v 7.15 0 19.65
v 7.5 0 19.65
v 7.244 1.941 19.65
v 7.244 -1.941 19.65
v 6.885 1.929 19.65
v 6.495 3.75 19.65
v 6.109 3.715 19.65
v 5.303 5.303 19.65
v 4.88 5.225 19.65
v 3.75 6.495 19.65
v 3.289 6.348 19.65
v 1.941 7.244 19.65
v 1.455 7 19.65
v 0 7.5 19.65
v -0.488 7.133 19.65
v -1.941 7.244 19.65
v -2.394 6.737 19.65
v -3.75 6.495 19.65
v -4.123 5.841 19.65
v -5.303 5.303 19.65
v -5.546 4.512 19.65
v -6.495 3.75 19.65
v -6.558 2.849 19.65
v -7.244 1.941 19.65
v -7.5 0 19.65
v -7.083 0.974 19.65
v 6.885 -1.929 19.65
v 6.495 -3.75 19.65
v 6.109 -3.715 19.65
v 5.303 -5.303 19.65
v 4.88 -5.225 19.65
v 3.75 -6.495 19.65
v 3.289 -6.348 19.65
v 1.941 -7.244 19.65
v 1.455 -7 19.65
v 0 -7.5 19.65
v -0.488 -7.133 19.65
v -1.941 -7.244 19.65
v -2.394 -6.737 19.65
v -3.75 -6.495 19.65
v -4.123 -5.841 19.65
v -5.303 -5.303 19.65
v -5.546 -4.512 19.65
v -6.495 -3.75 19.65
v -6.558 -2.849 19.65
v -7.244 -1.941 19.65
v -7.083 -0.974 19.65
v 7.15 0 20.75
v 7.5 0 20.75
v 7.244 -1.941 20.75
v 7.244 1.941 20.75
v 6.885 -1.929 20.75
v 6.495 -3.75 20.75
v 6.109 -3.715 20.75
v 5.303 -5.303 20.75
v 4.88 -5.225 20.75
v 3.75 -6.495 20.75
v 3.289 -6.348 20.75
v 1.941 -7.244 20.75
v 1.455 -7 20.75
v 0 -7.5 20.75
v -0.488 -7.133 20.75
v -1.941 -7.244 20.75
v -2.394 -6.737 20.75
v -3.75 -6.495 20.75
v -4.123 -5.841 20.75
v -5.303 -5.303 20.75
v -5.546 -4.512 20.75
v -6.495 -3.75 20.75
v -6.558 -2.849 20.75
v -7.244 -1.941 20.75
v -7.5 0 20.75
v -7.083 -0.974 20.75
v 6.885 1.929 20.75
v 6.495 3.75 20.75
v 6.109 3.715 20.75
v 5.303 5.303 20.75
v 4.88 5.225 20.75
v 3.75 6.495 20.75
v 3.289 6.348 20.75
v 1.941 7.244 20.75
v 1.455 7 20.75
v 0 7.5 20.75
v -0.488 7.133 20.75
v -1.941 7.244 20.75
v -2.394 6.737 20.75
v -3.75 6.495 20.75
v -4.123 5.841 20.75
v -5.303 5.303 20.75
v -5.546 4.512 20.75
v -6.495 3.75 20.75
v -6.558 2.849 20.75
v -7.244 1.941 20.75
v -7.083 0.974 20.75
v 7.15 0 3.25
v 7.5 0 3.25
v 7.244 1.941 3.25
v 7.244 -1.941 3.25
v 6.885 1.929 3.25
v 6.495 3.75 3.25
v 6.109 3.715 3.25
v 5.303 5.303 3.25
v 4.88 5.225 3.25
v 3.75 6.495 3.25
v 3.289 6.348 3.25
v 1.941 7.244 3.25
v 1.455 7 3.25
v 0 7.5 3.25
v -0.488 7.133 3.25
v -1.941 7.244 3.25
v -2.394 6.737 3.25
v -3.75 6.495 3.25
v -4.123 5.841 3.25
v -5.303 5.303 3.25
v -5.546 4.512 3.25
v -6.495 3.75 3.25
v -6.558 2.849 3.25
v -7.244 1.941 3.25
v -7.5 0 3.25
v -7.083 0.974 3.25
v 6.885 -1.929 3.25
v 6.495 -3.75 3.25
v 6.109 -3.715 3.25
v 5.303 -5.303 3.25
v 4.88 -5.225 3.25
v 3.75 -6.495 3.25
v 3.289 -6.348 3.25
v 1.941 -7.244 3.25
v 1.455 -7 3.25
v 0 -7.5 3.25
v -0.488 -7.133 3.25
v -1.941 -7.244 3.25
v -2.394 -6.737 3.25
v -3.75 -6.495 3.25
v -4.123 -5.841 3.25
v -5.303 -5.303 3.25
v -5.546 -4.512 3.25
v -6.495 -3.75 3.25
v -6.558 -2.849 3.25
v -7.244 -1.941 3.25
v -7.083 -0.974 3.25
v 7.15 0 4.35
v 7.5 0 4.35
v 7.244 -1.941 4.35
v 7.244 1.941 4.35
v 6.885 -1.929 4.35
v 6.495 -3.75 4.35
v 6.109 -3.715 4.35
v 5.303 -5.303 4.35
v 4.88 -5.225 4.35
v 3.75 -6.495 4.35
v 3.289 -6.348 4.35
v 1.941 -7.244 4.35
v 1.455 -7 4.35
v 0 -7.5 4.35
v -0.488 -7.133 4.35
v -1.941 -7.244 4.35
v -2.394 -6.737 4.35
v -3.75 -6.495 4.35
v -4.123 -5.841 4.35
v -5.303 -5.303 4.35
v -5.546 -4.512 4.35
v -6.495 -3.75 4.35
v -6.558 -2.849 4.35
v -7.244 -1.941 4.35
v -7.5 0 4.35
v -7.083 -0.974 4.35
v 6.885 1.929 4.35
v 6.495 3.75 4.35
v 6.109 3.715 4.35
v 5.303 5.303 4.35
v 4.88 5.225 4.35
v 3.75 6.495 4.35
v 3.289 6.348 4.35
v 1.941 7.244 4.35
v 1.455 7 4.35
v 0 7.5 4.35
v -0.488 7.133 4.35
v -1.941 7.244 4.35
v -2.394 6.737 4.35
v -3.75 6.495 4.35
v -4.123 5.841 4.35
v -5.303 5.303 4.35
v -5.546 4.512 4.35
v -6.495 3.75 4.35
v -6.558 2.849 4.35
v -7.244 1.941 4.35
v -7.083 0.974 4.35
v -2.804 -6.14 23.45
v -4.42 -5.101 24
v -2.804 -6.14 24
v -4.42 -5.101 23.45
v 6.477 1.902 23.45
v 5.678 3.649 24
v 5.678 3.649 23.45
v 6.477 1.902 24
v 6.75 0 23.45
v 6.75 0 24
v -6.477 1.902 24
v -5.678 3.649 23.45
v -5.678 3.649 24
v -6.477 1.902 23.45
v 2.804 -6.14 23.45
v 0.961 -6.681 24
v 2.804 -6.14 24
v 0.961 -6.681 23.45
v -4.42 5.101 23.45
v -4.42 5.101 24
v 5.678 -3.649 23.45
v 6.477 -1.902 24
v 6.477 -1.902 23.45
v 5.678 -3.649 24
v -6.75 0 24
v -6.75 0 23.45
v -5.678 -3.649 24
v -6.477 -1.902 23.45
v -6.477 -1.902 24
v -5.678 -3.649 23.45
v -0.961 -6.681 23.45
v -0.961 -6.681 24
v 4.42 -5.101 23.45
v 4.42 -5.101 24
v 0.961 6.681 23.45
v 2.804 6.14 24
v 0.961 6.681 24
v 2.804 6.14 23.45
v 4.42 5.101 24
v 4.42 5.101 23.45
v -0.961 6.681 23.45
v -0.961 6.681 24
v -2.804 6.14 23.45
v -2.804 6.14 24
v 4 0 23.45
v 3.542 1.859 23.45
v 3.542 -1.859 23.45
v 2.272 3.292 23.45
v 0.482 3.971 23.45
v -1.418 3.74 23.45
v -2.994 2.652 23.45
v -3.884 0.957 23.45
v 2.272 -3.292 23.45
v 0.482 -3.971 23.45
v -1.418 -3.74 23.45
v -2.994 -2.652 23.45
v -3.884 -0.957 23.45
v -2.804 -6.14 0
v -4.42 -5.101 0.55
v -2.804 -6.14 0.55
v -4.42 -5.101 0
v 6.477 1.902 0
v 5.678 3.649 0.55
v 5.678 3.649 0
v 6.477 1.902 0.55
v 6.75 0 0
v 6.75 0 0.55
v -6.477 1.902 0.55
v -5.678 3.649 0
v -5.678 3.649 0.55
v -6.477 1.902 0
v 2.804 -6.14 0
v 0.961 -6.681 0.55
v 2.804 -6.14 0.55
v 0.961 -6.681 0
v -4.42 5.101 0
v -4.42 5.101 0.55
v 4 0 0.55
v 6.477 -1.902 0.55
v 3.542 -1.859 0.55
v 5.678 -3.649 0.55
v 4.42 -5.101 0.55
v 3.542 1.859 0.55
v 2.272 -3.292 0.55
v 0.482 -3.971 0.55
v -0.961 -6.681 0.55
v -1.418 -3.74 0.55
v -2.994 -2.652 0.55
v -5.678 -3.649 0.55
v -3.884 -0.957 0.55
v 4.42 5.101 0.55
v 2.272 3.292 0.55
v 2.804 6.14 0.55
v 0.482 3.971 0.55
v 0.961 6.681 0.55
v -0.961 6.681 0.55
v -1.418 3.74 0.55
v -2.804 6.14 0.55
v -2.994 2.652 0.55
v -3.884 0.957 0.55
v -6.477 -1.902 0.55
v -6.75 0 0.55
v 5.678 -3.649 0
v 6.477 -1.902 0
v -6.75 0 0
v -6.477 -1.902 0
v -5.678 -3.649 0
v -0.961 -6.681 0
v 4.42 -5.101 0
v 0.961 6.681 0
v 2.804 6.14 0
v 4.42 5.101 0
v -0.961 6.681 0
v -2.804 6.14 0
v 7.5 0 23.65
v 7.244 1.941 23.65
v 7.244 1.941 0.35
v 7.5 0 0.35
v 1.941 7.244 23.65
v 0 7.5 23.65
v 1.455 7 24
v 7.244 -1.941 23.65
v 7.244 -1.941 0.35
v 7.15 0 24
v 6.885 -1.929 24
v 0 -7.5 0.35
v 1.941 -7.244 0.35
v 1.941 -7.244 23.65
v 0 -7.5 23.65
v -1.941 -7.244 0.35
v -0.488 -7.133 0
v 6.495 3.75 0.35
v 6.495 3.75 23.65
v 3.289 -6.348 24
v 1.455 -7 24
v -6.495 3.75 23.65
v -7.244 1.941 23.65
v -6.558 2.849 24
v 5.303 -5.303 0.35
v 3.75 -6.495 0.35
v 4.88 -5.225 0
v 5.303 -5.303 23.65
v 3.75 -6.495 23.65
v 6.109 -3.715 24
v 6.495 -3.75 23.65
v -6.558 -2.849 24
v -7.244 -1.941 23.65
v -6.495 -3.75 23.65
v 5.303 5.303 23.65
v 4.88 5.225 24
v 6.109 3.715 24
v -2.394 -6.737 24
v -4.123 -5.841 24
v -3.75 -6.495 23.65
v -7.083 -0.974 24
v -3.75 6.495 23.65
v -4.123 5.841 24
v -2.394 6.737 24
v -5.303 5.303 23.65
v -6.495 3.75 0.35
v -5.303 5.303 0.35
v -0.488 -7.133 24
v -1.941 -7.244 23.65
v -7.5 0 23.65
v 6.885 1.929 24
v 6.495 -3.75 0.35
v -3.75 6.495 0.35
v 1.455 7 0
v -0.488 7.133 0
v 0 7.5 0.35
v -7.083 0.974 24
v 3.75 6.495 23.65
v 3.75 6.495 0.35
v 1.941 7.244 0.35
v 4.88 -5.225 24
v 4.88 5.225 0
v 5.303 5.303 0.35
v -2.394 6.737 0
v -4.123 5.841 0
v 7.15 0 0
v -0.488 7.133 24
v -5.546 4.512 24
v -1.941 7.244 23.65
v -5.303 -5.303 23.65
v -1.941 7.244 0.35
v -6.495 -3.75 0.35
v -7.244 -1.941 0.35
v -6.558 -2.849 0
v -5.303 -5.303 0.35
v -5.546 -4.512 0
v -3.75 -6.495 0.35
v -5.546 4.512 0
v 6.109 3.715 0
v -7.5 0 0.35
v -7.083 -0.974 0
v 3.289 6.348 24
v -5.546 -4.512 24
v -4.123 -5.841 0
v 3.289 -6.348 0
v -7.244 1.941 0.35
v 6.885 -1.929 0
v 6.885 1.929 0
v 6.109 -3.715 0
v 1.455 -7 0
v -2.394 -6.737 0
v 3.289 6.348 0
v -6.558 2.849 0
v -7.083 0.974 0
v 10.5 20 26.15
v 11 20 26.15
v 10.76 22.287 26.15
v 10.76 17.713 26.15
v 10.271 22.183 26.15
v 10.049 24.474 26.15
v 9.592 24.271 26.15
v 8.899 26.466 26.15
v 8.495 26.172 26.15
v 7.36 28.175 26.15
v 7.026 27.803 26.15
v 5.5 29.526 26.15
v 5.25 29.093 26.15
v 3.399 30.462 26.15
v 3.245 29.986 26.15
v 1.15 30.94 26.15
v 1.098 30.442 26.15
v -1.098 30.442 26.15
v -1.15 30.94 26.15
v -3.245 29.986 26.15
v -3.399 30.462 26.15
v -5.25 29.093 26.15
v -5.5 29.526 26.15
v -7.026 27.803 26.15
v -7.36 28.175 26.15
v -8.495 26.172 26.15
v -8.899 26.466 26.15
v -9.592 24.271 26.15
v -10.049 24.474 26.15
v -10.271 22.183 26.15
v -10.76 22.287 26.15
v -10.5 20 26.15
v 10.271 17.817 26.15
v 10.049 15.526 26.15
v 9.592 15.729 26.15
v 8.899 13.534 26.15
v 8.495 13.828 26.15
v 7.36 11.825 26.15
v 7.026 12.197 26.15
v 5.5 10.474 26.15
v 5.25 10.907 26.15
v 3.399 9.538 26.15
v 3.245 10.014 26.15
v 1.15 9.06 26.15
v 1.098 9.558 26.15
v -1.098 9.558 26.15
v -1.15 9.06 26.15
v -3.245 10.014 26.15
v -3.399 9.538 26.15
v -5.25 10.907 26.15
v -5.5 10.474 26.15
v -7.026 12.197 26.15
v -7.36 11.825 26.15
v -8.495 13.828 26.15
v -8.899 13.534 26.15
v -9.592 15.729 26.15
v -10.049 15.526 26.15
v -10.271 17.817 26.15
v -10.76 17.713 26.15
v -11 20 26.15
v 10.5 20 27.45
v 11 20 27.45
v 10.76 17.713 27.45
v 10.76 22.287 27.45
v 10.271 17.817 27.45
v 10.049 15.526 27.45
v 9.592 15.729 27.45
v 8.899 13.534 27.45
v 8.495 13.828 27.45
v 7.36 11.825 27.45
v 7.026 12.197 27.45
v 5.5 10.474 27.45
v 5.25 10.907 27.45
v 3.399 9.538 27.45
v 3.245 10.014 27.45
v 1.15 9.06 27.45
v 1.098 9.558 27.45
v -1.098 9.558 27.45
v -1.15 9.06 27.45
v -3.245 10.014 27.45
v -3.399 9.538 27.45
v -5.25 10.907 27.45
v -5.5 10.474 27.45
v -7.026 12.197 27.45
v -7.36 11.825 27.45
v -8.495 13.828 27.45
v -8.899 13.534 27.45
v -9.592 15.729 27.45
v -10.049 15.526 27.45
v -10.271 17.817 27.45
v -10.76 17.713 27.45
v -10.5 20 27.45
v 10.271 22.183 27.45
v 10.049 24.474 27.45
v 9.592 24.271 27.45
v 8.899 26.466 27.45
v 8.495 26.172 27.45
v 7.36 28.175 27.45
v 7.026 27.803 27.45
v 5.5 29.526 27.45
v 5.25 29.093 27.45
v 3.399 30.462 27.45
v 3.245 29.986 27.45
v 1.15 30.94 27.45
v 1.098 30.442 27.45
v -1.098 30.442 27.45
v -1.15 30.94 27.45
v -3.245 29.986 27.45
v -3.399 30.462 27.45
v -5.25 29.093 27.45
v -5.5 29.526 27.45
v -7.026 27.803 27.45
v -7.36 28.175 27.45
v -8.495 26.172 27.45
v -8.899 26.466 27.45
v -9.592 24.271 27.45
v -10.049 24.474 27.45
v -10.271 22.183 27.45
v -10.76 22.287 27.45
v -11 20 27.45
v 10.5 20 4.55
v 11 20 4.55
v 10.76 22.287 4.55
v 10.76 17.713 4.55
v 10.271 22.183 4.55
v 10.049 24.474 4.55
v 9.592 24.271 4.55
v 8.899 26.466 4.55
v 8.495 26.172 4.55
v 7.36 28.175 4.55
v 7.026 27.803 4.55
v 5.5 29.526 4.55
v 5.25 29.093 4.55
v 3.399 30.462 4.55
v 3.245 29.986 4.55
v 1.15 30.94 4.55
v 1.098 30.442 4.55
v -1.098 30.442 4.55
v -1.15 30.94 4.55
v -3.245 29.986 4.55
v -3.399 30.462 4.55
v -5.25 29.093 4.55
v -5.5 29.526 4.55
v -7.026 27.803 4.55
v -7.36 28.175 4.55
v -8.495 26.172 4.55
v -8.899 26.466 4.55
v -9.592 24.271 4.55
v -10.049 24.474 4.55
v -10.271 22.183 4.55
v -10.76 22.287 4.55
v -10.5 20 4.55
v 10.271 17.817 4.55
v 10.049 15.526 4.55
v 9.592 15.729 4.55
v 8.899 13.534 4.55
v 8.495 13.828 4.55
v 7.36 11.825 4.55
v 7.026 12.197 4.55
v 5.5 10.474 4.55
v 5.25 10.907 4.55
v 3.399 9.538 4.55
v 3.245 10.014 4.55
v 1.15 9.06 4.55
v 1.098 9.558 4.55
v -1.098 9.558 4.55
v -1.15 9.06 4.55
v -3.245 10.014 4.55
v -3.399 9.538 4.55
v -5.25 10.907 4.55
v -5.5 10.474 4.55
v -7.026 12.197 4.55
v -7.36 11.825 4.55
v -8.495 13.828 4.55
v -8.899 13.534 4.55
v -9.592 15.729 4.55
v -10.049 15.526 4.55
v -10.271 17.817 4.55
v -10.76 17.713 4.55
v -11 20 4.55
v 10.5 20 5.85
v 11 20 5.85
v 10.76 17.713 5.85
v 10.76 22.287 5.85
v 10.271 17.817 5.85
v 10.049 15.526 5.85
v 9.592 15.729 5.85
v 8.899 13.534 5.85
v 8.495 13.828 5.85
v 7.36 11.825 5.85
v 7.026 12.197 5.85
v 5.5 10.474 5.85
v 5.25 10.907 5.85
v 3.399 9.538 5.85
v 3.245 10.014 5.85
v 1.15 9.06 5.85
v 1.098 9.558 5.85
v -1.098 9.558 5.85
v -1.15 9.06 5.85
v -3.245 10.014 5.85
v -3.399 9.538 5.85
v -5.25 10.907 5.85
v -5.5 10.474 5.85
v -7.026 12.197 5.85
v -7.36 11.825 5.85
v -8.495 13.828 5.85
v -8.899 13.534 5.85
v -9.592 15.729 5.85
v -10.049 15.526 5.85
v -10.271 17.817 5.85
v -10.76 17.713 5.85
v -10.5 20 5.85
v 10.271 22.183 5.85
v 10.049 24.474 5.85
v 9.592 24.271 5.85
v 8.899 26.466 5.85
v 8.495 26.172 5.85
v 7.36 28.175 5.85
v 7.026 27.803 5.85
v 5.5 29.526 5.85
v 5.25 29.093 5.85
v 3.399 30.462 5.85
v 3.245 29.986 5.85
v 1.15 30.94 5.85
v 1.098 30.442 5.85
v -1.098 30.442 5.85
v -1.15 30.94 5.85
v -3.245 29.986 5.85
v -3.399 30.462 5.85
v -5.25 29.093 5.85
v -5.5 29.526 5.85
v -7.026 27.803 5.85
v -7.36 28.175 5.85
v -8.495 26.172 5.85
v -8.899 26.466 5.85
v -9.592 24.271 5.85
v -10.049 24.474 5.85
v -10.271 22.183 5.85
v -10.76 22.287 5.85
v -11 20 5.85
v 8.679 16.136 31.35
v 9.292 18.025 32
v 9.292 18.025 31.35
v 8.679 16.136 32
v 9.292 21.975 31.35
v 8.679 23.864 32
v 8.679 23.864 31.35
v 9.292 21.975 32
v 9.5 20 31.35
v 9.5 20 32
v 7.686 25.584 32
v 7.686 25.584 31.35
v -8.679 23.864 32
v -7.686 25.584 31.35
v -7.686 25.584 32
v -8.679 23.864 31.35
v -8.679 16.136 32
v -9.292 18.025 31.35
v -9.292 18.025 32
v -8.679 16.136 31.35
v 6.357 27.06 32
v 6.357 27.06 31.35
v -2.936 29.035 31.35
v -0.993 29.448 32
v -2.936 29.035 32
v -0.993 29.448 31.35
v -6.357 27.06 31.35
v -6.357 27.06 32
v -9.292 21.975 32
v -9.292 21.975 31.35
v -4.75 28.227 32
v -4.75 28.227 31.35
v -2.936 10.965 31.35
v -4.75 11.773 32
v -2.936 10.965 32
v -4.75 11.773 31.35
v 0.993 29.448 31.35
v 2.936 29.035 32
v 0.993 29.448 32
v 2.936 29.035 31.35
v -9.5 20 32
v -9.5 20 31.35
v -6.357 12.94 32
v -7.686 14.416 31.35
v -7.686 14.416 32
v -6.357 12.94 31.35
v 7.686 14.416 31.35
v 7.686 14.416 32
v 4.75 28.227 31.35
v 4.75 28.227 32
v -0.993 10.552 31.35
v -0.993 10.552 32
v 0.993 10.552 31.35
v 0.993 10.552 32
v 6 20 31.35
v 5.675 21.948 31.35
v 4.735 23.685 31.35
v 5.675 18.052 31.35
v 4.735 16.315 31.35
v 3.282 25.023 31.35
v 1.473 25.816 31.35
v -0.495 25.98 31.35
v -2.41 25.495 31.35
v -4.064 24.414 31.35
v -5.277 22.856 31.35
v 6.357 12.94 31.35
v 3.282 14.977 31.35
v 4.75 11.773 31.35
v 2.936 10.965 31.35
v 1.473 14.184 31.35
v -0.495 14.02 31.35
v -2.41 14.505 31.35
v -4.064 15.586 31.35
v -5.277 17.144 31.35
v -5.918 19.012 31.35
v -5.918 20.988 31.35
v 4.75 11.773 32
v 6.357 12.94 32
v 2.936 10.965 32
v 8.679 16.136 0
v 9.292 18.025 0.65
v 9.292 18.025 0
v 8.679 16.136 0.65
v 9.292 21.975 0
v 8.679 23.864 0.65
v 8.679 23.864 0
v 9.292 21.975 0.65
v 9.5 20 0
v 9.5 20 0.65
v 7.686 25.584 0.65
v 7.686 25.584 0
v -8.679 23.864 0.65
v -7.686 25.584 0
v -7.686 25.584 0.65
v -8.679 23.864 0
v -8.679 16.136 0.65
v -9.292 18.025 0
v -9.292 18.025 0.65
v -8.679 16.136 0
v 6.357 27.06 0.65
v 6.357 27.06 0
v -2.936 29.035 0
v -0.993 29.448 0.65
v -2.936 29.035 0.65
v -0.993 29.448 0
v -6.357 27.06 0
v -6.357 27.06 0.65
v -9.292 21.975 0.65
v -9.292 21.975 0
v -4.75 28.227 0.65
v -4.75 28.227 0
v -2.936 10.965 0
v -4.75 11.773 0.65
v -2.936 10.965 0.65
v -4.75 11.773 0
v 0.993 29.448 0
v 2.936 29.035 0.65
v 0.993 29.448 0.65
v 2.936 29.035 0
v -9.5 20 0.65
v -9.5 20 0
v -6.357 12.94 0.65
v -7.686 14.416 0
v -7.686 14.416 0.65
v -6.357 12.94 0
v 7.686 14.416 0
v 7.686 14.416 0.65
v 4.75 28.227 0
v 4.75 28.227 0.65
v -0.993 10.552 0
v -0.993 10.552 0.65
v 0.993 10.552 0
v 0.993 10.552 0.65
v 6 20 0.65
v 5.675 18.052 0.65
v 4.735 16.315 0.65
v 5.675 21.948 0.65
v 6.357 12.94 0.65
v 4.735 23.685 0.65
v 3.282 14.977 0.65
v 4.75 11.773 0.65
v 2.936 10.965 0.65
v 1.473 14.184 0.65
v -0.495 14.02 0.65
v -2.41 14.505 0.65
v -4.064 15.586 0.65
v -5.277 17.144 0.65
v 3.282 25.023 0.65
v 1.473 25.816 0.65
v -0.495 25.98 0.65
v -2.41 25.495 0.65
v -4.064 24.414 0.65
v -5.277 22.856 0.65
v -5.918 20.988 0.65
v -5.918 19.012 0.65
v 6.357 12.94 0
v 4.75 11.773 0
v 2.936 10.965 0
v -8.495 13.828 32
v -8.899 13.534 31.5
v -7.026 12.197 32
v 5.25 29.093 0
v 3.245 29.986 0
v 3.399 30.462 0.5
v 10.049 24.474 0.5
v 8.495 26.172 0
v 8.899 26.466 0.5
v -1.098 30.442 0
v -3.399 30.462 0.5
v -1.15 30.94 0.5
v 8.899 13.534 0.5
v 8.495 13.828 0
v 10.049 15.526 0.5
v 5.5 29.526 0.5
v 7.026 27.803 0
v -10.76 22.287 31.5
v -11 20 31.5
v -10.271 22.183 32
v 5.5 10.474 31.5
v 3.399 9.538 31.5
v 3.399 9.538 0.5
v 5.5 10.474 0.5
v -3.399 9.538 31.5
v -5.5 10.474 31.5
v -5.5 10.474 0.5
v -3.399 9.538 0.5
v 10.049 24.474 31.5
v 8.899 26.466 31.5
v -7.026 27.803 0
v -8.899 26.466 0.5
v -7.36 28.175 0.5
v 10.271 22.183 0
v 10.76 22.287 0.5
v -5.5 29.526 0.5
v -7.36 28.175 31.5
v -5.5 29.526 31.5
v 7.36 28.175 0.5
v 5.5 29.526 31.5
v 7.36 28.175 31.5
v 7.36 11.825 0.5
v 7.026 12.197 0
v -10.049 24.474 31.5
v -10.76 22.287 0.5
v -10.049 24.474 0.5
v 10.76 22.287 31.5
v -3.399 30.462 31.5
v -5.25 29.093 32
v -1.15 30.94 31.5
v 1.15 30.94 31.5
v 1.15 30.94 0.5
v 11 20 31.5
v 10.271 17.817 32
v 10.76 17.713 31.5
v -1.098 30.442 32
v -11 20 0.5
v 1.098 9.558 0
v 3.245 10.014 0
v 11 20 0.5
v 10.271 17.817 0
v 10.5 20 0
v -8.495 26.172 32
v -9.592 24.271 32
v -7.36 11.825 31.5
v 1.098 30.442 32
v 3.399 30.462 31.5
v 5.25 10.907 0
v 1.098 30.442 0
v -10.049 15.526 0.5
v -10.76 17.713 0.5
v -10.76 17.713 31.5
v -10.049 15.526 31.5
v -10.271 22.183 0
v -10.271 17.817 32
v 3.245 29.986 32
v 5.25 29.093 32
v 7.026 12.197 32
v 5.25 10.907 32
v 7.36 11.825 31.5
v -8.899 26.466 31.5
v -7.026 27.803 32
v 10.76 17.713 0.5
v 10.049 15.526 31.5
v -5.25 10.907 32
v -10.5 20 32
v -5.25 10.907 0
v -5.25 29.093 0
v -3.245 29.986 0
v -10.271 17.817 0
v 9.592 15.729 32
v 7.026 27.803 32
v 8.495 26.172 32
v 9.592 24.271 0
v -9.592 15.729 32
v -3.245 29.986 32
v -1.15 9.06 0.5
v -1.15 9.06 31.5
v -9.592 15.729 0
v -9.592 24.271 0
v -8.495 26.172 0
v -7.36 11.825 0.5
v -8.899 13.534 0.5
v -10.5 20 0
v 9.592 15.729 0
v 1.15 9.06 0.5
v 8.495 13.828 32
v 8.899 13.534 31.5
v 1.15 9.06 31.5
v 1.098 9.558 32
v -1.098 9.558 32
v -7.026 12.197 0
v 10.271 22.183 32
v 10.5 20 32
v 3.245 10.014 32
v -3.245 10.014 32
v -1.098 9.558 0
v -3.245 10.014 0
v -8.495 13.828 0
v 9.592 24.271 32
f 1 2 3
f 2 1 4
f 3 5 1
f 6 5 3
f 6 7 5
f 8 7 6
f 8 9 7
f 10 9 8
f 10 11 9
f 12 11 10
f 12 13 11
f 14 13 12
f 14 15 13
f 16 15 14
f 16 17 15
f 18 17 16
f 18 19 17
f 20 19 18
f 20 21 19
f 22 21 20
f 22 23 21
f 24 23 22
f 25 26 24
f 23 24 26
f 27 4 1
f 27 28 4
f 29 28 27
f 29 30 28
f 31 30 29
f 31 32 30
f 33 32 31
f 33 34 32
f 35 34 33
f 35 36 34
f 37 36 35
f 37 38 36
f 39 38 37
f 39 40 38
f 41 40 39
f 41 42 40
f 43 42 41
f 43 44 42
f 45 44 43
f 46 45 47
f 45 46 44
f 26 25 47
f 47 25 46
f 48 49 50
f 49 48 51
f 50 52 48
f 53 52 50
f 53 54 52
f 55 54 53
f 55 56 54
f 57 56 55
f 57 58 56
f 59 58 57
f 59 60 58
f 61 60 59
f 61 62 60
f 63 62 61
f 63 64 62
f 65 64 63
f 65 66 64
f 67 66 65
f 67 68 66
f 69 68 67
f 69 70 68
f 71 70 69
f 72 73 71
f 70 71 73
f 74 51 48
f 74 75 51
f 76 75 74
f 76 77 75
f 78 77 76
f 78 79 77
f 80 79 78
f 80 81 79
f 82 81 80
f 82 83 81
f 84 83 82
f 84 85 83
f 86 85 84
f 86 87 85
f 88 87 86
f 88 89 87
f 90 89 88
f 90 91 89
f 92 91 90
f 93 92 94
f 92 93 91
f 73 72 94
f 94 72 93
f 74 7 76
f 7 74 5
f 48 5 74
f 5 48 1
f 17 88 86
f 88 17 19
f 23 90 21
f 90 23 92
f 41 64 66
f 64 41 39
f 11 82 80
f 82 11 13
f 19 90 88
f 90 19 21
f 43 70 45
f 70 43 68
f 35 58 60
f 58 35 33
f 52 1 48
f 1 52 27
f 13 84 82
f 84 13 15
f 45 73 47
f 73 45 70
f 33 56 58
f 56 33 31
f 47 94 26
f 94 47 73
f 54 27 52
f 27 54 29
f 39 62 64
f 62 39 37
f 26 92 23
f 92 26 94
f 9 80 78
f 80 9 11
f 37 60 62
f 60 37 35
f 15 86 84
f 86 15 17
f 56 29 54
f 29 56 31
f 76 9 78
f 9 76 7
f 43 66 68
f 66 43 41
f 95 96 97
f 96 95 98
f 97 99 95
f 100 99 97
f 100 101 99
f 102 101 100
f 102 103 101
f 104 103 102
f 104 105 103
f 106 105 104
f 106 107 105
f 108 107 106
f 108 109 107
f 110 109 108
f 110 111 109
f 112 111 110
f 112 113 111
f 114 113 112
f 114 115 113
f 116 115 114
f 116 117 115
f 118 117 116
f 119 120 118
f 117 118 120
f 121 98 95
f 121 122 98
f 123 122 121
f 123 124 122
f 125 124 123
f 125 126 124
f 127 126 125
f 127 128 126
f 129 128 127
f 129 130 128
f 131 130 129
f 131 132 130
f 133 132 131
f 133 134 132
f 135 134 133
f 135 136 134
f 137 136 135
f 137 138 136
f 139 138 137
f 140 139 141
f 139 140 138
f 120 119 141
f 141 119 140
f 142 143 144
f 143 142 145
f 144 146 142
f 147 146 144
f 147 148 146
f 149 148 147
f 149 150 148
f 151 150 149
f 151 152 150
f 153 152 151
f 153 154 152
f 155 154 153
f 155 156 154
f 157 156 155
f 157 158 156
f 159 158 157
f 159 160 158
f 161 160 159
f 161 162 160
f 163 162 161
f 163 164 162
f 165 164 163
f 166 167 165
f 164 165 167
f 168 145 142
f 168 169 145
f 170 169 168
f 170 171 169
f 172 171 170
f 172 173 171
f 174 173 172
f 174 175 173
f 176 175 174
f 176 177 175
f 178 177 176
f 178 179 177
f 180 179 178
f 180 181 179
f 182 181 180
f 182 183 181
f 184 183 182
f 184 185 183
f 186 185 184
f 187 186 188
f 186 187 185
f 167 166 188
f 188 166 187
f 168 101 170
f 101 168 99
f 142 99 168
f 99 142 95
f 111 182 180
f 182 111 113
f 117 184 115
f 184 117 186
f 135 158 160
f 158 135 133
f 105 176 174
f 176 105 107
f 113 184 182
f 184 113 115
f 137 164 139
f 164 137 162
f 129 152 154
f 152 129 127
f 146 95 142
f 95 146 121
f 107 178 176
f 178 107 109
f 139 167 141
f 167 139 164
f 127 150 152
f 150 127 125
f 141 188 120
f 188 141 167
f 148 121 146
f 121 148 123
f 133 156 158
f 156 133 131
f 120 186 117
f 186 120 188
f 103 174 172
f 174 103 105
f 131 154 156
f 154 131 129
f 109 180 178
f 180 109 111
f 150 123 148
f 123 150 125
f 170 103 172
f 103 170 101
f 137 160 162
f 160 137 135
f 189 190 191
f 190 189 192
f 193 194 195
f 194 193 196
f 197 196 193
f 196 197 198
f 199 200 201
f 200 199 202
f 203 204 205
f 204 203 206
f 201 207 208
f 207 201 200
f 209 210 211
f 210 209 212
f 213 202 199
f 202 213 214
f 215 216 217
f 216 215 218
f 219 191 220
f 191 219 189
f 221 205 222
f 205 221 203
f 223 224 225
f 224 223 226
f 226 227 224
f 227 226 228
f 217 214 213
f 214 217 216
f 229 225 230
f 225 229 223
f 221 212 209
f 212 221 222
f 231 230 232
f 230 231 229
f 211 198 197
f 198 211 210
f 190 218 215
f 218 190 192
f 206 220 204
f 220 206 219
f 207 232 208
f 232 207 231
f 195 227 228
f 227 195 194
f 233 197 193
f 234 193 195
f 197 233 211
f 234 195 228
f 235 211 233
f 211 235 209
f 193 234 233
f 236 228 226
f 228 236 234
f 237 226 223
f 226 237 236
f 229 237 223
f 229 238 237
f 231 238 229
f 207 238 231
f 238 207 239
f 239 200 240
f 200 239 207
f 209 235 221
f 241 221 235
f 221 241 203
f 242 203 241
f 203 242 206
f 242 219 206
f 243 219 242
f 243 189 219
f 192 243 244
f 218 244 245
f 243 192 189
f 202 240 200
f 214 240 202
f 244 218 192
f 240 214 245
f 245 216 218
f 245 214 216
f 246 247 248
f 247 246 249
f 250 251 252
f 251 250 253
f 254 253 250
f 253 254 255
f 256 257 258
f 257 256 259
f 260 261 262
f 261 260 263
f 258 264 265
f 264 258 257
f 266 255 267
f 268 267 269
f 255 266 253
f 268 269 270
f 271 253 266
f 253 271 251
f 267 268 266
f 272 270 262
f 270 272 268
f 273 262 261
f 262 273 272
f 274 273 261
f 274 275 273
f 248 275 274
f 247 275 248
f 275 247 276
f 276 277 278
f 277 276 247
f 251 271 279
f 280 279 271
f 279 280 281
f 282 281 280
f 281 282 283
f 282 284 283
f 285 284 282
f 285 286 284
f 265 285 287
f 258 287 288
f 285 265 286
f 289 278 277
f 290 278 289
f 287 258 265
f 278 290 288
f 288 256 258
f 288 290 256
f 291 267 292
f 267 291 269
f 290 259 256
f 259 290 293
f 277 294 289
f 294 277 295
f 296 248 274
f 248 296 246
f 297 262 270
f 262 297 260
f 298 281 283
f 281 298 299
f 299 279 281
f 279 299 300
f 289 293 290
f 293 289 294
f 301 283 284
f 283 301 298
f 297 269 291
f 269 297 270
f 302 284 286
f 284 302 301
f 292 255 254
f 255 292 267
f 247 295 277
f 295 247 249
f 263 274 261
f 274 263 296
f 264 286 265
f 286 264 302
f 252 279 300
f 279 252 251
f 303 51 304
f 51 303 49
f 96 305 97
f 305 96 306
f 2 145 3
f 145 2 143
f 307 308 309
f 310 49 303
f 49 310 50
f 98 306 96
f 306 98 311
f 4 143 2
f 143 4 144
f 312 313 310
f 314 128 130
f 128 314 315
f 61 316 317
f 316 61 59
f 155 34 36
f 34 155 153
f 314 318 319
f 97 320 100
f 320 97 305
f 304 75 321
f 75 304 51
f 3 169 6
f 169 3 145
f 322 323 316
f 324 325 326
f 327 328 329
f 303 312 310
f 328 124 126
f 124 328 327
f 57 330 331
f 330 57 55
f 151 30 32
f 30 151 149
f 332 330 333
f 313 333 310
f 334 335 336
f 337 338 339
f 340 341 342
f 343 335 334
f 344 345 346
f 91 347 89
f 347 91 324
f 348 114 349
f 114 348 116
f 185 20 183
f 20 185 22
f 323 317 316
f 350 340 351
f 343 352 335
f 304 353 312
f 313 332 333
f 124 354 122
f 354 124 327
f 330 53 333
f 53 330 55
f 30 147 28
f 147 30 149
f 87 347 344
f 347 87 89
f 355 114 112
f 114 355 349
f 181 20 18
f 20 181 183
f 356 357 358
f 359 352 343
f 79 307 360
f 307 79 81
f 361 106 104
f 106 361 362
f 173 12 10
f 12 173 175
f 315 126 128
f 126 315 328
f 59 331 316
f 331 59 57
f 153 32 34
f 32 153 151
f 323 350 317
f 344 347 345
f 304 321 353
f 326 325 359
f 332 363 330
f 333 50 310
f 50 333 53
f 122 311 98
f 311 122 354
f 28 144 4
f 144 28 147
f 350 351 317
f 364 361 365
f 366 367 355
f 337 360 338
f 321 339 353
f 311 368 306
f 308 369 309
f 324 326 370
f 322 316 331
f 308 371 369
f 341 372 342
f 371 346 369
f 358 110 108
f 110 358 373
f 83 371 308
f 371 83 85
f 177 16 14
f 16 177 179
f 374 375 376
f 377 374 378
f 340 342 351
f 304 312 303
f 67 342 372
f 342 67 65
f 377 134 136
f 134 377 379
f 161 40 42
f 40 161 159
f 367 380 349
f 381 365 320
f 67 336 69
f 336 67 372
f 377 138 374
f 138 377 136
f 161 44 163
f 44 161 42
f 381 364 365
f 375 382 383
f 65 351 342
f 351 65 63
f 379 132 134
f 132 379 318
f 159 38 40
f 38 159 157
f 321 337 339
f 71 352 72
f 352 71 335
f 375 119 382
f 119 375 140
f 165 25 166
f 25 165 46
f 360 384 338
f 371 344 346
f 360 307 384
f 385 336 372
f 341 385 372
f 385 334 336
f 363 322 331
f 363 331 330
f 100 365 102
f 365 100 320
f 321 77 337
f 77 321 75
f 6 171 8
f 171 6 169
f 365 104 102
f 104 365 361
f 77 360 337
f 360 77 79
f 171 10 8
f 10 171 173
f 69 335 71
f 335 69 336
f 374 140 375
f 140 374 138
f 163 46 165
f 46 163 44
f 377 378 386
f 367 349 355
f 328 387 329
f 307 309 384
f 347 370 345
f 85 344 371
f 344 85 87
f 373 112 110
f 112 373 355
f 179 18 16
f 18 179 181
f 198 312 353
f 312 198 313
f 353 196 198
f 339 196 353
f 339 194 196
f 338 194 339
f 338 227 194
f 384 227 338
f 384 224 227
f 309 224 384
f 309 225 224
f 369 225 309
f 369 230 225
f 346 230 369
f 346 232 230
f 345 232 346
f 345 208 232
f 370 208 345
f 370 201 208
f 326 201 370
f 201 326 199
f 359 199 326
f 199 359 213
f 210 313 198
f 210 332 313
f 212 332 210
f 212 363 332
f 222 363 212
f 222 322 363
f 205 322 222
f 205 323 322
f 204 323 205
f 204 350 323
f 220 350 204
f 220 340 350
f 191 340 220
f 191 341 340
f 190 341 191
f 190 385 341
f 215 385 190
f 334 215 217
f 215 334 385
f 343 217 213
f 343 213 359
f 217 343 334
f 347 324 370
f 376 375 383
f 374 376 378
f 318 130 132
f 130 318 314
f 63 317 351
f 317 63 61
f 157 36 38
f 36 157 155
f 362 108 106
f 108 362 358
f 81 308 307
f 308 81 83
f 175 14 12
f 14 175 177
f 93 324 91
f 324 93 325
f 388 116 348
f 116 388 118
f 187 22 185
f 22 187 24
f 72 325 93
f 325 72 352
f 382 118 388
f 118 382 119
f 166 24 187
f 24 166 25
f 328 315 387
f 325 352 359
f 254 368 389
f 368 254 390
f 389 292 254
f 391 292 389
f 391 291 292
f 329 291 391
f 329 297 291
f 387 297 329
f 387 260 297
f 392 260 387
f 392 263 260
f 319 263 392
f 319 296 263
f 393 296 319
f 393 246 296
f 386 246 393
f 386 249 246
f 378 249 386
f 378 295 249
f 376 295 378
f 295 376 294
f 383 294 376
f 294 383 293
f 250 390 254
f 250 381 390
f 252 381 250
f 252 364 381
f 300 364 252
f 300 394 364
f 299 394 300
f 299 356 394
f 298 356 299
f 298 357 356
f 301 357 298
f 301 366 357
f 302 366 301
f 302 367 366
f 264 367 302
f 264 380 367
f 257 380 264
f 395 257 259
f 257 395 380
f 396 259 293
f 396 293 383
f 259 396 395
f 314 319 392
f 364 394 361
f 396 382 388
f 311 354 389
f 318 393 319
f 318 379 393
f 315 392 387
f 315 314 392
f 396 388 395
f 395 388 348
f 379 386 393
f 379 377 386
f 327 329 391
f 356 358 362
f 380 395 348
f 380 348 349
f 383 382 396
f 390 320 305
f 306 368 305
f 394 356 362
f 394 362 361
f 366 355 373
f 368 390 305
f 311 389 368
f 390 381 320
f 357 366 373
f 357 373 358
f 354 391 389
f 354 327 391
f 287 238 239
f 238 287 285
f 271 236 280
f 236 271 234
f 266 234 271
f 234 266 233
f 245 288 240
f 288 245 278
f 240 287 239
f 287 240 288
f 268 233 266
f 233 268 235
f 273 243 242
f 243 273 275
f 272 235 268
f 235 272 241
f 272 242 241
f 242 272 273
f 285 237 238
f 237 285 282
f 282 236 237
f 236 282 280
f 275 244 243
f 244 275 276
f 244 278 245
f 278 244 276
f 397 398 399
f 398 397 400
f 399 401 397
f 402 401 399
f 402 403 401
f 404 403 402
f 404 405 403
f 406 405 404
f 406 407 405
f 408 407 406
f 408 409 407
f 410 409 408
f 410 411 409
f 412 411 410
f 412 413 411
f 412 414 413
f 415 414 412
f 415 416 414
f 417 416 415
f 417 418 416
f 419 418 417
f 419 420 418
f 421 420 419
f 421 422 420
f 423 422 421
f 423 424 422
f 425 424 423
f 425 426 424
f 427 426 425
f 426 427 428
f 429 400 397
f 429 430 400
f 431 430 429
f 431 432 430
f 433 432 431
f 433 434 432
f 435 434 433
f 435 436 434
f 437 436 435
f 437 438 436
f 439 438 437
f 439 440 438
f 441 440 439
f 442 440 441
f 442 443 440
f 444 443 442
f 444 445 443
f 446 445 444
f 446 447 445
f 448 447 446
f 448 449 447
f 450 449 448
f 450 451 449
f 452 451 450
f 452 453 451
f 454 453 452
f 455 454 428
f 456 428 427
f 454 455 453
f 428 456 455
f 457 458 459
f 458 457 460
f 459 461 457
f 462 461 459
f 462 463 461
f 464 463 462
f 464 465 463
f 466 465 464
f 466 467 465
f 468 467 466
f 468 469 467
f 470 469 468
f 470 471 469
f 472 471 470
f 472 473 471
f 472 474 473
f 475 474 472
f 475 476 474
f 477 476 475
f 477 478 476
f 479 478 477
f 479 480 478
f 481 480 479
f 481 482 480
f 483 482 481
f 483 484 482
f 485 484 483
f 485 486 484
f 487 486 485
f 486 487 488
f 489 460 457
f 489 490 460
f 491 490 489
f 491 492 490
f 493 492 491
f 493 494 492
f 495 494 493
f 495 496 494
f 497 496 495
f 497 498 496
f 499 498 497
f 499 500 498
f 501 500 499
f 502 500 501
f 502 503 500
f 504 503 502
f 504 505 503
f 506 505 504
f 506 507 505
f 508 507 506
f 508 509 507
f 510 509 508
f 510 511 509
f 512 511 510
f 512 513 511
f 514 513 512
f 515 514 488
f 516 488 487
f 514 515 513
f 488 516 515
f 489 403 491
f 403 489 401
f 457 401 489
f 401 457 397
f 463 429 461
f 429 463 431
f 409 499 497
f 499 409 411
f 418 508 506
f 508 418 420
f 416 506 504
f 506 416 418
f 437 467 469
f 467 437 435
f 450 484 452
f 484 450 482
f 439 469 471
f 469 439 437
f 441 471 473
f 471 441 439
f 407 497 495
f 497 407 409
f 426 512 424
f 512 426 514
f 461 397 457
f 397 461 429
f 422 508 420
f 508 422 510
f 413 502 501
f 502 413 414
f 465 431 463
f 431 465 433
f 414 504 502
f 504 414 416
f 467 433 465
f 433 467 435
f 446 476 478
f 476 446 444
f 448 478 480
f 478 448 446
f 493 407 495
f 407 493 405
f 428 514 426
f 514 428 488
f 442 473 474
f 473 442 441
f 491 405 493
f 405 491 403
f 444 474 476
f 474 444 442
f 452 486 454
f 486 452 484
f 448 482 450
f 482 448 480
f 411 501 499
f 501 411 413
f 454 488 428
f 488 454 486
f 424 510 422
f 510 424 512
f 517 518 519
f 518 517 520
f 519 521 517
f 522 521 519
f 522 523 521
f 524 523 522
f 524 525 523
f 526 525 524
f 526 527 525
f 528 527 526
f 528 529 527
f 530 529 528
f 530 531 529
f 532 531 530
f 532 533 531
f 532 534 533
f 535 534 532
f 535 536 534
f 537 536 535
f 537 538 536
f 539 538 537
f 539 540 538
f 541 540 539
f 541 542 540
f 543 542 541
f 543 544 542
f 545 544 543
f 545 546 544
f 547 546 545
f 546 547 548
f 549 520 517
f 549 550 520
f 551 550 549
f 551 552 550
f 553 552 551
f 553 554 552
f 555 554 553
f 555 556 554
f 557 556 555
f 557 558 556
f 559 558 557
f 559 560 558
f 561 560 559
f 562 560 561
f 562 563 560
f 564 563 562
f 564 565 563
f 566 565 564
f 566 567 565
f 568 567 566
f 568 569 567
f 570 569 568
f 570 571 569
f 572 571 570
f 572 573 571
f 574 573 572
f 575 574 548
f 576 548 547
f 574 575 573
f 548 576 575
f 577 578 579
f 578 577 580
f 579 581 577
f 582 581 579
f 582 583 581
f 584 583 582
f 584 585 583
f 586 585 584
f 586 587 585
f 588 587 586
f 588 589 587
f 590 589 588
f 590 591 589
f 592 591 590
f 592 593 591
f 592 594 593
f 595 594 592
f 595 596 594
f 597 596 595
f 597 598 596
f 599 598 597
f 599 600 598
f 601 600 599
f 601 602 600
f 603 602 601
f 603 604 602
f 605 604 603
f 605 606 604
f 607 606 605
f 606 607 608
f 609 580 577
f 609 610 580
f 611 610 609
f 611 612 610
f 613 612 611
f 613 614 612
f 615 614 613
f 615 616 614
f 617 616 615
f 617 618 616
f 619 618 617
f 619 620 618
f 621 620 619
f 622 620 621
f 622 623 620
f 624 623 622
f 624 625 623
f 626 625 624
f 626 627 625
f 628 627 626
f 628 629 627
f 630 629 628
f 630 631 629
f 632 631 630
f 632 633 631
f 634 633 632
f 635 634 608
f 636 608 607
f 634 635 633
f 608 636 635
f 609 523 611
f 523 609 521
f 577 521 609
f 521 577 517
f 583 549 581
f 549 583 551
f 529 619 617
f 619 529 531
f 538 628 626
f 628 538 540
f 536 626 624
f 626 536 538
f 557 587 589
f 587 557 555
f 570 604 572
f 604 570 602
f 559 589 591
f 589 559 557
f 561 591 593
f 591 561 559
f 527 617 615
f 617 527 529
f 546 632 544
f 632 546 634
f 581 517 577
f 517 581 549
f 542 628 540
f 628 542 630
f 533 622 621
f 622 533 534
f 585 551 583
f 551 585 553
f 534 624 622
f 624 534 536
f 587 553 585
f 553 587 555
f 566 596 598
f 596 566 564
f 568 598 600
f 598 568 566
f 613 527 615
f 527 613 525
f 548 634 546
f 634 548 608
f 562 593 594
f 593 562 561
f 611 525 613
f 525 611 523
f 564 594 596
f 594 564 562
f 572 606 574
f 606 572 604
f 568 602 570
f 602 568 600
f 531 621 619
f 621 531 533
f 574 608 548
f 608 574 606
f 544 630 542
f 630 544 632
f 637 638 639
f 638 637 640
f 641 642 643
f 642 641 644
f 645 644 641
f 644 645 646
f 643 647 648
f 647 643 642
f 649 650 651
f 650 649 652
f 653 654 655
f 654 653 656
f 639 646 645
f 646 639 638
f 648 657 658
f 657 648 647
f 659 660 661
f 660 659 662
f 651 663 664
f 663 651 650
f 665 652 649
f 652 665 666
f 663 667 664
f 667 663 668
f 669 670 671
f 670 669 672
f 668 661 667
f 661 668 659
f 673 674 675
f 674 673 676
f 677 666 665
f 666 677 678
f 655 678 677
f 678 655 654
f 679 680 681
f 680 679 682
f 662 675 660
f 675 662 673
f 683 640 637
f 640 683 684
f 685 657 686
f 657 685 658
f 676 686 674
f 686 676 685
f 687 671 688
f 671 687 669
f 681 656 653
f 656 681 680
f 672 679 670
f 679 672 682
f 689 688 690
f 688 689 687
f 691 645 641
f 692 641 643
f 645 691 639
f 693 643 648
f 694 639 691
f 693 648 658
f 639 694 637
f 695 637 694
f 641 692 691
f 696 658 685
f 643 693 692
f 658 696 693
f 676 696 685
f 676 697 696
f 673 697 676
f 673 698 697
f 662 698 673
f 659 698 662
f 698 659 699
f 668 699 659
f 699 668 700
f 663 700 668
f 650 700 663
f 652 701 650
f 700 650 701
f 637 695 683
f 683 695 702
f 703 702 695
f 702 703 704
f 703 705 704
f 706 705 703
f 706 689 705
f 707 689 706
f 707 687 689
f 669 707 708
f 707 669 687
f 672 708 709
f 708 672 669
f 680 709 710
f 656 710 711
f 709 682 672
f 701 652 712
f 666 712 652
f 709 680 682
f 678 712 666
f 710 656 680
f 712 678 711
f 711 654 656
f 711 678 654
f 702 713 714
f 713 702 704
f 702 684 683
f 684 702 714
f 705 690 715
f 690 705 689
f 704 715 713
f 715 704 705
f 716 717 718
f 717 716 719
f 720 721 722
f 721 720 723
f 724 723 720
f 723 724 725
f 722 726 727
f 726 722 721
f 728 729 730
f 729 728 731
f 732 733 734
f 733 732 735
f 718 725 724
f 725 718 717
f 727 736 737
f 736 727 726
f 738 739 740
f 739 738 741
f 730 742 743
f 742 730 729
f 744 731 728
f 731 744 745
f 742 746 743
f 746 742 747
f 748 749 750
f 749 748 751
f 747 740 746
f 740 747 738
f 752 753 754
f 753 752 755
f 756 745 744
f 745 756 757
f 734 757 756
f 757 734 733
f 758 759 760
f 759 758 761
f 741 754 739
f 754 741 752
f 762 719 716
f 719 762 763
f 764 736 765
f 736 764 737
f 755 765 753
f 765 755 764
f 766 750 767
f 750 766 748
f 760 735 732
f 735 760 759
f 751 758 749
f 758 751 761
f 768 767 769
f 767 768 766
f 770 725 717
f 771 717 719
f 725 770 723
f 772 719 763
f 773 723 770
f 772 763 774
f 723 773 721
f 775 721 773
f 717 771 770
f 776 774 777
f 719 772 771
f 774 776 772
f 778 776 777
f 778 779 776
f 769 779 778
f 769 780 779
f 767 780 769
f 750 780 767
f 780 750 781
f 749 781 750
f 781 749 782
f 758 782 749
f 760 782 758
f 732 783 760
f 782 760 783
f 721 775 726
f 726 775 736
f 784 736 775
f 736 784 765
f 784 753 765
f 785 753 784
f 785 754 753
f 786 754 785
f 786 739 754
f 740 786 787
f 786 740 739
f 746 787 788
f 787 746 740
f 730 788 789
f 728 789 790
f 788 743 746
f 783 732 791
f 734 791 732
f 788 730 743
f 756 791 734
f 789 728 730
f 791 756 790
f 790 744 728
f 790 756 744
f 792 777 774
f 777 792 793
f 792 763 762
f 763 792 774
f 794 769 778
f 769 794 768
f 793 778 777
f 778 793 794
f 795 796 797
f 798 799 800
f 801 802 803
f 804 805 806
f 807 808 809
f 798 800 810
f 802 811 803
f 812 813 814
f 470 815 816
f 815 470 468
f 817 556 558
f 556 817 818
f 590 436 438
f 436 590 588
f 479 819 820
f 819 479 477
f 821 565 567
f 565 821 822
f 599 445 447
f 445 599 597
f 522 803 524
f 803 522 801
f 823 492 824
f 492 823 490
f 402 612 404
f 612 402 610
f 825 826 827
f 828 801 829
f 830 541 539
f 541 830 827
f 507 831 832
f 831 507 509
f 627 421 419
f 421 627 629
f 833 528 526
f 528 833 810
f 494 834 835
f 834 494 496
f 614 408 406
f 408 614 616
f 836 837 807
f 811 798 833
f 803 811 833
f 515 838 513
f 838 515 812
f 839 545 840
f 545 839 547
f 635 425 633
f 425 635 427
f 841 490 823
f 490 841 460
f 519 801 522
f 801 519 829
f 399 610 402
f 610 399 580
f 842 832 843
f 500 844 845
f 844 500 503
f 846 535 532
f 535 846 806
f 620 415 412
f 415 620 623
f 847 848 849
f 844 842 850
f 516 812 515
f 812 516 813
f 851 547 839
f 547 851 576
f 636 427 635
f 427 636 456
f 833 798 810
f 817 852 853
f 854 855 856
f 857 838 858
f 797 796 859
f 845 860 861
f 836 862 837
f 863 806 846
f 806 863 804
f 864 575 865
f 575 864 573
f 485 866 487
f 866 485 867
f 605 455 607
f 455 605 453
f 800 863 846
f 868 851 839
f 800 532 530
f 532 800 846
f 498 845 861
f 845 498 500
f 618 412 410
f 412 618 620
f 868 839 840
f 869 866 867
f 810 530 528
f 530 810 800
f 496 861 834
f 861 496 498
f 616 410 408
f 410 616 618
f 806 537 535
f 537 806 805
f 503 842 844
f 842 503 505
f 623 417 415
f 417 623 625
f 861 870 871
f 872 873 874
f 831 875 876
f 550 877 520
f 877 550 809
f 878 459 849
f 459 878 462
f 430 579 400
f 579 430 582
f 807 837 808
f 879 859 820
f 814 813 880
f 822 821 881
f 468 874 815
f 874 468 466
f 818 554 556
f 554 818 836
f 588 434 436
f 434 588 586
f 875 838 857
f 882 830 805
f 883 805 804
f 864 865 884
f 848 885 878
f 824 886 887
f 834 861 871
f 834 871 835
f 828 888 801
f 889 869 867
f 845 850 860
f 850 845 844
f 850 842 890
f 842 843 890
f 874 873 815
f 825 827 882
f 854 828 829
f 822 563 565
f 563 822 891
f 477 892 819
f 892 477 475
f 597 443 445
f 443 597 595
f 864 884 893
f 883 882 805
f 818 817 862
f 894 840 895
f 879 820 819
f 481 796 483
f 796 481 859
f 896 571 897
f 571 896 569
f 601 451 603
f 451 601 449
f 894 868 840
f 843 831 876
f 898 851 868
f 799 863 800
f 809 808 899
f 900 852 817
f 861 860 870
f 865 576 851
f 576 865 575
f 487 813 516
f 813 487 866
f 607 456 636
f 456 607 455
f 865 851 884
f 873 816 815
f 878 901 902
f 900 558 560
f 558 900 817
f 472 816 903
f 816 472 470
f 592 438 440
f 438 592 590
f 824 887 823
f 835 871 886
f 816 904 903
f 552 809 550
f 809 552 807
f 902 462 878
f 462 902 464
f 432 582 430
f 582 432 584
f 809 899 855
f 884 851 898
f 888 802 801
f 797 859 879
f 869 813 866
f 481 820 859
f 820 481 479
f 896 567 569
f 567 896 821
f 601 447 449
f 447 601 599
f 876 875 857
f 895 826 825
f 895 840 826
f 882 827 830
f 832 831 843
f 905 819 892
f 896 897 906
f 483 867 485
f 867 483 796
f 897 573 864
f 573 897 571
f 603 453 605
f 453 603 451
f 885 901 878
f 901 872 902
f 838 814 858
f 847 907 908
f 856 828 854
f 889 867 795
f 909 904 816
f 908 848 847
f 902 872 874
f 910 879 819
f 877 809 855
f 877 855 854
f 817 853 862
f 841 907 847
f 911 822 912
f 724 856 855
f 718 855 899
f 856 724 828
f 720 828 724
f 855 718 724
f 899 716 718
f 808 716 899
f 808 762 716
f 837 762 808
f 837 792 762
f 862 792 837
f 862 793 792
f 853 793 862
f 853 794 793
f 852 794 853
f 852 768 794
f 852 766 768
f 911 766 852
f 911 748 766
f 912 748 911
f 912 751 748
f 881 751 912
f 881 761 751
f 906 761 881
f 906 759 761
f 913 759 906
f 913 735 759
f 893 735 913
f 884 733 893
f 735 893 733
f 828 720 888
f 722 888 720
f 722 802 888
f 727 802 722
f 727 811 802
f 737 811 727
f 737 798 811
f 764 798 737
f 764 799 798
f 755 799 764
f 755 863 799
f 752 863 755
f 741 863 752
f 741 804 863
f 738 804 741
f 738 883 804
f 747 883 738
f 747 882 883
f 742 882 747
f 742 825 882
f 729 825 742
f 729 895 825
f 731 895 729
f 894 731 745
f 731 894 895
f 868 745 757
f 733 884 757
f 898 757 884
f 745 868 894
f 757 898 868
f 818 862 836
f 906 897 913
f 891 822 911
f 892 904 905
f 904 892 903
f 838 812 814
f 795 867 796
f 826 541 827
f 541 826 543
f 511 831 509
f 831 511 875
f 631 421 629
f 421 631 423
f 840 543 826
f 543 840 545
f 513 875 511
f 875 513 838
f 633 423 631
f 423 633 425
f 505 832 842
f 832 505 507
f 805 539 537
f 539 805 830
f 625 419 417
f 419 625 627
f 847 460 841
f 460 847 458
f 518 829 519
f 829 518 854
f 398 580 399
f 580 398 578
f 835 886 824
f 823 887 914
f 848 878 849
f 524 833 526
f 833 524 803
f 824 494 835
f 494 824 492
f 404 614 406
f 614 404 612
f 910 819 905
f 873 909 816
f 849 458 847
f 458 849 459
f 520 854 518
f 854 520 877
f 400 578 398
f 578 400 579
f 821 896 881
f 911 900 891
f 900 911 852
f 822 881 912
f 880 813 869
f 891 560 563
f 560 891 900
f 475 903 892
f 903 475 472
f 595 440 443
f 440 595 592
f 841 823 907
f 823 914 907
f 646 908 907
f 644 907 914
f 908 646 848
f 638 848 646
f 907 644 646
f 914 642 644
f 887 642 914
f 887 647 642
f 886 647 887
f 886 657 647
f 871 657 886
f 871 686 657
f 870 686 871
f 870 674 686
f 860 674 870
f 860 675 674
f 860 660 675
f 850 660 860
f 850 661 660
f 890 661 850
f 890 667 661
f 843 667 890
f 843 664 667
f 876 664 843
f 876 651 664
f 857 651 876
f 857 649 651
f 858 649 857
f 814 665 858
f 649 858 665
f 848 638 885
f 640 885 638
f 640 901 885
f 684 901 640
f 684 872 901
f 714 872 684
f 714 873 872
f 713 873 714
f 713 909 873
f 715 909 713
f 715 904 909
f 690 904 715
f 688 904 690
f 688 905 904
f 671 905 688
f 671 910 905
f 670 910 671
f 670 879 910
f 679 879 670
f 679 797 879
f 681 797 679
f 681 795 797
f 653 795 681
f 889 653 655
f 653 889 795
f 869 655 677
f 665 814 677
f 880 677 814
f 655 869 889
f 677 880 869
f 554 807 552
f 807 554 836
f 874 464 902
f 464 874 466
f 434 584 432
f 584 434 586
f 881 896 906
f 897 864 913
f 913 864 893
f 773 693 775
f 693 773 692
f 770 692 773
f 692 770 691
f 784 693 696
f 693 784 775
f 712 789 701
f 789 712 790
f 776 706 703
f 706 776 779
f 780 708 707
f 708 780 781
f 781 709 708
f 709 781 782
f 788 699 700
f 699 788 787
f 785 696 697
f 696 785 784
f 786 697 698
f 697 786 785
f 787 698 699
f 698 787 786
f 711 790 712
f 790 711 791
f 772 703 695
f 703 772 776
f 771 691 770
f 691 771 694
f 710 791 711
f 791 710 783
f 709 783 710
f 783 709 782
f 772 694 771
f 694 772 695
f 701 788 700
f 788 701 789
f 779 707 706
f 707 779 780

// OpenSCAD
// Adapted from http://www.thingiverse.com/thing:73470

// Open SCAD model of linear Bearing LM-8-UU & KB-12-WW

//     LM-8-UU        KB-12-WW
//	D_Int =  8.0	D_Int = 12.0
//	D_Ext = 15.0	D_Ext = 22.0
//	D_1   = 14.3	D_1   = 21.0
//	L     = 24.0	L     = 32.0
//	W     =  1.1	W     =  1.3
//	B     = 17.5	B     = 22.9



module groove(d1, d2, w) {
	difference() {
		cylinder(r=d1/2+1, h=w, center=true);
		cylinder(r=d2/2  , h=w, center=true);
	}
}

module lb(D_Int=8, D_Ext=15, D_1=14.3, L=24, W=1.1, B=17.5) {
chamf = D_Ext - D_1;
	difference() {
		hull() {
			cylinder(r=D_Ext/2, h=L-chamf, center=true);
			cylinder(r=D_1  /2, h=L      , center=true);
		}
		cylinder(r=D_Int/2, h=L+2    , center=true);
		translate([0, 0, B/2-W/2]) groove(D_Ext, D_1, W);
		translate([0, 0,-B/2+W/2]) groove(D_Ext, D_1, W);
		translate([0, 0,     L/2]) groove(D_Ext-(D_Ext-D_Int)/2, 1, W);
		translate([0, 0,    -L/2]) groove(D_Ext-(D_Ext-D_Int)/2, 1, W);
	}
}


module linear_bearing(linear_bearing_type) {
	if(linear_bearing_type == "LM-8-UU") {   //LM-8-UU
		lb(D_Int=8, D_Ext=15, D_1=14.3, L=24, W=1.1, B=17.5);
	}
	else {
		if(linear_bearing_type == "KB-12-WW") {   //KB-12-WW
			lb(D_Int=12, D_Ext=22, D_1=21, L=32, W=1.3, B=22.9);
		}
	}
}


translate([0,  0, 12]) linear_bearing("LM-8-UU" );
translate([0, 20, 16]) linear_bearing("KB-12-WW");
